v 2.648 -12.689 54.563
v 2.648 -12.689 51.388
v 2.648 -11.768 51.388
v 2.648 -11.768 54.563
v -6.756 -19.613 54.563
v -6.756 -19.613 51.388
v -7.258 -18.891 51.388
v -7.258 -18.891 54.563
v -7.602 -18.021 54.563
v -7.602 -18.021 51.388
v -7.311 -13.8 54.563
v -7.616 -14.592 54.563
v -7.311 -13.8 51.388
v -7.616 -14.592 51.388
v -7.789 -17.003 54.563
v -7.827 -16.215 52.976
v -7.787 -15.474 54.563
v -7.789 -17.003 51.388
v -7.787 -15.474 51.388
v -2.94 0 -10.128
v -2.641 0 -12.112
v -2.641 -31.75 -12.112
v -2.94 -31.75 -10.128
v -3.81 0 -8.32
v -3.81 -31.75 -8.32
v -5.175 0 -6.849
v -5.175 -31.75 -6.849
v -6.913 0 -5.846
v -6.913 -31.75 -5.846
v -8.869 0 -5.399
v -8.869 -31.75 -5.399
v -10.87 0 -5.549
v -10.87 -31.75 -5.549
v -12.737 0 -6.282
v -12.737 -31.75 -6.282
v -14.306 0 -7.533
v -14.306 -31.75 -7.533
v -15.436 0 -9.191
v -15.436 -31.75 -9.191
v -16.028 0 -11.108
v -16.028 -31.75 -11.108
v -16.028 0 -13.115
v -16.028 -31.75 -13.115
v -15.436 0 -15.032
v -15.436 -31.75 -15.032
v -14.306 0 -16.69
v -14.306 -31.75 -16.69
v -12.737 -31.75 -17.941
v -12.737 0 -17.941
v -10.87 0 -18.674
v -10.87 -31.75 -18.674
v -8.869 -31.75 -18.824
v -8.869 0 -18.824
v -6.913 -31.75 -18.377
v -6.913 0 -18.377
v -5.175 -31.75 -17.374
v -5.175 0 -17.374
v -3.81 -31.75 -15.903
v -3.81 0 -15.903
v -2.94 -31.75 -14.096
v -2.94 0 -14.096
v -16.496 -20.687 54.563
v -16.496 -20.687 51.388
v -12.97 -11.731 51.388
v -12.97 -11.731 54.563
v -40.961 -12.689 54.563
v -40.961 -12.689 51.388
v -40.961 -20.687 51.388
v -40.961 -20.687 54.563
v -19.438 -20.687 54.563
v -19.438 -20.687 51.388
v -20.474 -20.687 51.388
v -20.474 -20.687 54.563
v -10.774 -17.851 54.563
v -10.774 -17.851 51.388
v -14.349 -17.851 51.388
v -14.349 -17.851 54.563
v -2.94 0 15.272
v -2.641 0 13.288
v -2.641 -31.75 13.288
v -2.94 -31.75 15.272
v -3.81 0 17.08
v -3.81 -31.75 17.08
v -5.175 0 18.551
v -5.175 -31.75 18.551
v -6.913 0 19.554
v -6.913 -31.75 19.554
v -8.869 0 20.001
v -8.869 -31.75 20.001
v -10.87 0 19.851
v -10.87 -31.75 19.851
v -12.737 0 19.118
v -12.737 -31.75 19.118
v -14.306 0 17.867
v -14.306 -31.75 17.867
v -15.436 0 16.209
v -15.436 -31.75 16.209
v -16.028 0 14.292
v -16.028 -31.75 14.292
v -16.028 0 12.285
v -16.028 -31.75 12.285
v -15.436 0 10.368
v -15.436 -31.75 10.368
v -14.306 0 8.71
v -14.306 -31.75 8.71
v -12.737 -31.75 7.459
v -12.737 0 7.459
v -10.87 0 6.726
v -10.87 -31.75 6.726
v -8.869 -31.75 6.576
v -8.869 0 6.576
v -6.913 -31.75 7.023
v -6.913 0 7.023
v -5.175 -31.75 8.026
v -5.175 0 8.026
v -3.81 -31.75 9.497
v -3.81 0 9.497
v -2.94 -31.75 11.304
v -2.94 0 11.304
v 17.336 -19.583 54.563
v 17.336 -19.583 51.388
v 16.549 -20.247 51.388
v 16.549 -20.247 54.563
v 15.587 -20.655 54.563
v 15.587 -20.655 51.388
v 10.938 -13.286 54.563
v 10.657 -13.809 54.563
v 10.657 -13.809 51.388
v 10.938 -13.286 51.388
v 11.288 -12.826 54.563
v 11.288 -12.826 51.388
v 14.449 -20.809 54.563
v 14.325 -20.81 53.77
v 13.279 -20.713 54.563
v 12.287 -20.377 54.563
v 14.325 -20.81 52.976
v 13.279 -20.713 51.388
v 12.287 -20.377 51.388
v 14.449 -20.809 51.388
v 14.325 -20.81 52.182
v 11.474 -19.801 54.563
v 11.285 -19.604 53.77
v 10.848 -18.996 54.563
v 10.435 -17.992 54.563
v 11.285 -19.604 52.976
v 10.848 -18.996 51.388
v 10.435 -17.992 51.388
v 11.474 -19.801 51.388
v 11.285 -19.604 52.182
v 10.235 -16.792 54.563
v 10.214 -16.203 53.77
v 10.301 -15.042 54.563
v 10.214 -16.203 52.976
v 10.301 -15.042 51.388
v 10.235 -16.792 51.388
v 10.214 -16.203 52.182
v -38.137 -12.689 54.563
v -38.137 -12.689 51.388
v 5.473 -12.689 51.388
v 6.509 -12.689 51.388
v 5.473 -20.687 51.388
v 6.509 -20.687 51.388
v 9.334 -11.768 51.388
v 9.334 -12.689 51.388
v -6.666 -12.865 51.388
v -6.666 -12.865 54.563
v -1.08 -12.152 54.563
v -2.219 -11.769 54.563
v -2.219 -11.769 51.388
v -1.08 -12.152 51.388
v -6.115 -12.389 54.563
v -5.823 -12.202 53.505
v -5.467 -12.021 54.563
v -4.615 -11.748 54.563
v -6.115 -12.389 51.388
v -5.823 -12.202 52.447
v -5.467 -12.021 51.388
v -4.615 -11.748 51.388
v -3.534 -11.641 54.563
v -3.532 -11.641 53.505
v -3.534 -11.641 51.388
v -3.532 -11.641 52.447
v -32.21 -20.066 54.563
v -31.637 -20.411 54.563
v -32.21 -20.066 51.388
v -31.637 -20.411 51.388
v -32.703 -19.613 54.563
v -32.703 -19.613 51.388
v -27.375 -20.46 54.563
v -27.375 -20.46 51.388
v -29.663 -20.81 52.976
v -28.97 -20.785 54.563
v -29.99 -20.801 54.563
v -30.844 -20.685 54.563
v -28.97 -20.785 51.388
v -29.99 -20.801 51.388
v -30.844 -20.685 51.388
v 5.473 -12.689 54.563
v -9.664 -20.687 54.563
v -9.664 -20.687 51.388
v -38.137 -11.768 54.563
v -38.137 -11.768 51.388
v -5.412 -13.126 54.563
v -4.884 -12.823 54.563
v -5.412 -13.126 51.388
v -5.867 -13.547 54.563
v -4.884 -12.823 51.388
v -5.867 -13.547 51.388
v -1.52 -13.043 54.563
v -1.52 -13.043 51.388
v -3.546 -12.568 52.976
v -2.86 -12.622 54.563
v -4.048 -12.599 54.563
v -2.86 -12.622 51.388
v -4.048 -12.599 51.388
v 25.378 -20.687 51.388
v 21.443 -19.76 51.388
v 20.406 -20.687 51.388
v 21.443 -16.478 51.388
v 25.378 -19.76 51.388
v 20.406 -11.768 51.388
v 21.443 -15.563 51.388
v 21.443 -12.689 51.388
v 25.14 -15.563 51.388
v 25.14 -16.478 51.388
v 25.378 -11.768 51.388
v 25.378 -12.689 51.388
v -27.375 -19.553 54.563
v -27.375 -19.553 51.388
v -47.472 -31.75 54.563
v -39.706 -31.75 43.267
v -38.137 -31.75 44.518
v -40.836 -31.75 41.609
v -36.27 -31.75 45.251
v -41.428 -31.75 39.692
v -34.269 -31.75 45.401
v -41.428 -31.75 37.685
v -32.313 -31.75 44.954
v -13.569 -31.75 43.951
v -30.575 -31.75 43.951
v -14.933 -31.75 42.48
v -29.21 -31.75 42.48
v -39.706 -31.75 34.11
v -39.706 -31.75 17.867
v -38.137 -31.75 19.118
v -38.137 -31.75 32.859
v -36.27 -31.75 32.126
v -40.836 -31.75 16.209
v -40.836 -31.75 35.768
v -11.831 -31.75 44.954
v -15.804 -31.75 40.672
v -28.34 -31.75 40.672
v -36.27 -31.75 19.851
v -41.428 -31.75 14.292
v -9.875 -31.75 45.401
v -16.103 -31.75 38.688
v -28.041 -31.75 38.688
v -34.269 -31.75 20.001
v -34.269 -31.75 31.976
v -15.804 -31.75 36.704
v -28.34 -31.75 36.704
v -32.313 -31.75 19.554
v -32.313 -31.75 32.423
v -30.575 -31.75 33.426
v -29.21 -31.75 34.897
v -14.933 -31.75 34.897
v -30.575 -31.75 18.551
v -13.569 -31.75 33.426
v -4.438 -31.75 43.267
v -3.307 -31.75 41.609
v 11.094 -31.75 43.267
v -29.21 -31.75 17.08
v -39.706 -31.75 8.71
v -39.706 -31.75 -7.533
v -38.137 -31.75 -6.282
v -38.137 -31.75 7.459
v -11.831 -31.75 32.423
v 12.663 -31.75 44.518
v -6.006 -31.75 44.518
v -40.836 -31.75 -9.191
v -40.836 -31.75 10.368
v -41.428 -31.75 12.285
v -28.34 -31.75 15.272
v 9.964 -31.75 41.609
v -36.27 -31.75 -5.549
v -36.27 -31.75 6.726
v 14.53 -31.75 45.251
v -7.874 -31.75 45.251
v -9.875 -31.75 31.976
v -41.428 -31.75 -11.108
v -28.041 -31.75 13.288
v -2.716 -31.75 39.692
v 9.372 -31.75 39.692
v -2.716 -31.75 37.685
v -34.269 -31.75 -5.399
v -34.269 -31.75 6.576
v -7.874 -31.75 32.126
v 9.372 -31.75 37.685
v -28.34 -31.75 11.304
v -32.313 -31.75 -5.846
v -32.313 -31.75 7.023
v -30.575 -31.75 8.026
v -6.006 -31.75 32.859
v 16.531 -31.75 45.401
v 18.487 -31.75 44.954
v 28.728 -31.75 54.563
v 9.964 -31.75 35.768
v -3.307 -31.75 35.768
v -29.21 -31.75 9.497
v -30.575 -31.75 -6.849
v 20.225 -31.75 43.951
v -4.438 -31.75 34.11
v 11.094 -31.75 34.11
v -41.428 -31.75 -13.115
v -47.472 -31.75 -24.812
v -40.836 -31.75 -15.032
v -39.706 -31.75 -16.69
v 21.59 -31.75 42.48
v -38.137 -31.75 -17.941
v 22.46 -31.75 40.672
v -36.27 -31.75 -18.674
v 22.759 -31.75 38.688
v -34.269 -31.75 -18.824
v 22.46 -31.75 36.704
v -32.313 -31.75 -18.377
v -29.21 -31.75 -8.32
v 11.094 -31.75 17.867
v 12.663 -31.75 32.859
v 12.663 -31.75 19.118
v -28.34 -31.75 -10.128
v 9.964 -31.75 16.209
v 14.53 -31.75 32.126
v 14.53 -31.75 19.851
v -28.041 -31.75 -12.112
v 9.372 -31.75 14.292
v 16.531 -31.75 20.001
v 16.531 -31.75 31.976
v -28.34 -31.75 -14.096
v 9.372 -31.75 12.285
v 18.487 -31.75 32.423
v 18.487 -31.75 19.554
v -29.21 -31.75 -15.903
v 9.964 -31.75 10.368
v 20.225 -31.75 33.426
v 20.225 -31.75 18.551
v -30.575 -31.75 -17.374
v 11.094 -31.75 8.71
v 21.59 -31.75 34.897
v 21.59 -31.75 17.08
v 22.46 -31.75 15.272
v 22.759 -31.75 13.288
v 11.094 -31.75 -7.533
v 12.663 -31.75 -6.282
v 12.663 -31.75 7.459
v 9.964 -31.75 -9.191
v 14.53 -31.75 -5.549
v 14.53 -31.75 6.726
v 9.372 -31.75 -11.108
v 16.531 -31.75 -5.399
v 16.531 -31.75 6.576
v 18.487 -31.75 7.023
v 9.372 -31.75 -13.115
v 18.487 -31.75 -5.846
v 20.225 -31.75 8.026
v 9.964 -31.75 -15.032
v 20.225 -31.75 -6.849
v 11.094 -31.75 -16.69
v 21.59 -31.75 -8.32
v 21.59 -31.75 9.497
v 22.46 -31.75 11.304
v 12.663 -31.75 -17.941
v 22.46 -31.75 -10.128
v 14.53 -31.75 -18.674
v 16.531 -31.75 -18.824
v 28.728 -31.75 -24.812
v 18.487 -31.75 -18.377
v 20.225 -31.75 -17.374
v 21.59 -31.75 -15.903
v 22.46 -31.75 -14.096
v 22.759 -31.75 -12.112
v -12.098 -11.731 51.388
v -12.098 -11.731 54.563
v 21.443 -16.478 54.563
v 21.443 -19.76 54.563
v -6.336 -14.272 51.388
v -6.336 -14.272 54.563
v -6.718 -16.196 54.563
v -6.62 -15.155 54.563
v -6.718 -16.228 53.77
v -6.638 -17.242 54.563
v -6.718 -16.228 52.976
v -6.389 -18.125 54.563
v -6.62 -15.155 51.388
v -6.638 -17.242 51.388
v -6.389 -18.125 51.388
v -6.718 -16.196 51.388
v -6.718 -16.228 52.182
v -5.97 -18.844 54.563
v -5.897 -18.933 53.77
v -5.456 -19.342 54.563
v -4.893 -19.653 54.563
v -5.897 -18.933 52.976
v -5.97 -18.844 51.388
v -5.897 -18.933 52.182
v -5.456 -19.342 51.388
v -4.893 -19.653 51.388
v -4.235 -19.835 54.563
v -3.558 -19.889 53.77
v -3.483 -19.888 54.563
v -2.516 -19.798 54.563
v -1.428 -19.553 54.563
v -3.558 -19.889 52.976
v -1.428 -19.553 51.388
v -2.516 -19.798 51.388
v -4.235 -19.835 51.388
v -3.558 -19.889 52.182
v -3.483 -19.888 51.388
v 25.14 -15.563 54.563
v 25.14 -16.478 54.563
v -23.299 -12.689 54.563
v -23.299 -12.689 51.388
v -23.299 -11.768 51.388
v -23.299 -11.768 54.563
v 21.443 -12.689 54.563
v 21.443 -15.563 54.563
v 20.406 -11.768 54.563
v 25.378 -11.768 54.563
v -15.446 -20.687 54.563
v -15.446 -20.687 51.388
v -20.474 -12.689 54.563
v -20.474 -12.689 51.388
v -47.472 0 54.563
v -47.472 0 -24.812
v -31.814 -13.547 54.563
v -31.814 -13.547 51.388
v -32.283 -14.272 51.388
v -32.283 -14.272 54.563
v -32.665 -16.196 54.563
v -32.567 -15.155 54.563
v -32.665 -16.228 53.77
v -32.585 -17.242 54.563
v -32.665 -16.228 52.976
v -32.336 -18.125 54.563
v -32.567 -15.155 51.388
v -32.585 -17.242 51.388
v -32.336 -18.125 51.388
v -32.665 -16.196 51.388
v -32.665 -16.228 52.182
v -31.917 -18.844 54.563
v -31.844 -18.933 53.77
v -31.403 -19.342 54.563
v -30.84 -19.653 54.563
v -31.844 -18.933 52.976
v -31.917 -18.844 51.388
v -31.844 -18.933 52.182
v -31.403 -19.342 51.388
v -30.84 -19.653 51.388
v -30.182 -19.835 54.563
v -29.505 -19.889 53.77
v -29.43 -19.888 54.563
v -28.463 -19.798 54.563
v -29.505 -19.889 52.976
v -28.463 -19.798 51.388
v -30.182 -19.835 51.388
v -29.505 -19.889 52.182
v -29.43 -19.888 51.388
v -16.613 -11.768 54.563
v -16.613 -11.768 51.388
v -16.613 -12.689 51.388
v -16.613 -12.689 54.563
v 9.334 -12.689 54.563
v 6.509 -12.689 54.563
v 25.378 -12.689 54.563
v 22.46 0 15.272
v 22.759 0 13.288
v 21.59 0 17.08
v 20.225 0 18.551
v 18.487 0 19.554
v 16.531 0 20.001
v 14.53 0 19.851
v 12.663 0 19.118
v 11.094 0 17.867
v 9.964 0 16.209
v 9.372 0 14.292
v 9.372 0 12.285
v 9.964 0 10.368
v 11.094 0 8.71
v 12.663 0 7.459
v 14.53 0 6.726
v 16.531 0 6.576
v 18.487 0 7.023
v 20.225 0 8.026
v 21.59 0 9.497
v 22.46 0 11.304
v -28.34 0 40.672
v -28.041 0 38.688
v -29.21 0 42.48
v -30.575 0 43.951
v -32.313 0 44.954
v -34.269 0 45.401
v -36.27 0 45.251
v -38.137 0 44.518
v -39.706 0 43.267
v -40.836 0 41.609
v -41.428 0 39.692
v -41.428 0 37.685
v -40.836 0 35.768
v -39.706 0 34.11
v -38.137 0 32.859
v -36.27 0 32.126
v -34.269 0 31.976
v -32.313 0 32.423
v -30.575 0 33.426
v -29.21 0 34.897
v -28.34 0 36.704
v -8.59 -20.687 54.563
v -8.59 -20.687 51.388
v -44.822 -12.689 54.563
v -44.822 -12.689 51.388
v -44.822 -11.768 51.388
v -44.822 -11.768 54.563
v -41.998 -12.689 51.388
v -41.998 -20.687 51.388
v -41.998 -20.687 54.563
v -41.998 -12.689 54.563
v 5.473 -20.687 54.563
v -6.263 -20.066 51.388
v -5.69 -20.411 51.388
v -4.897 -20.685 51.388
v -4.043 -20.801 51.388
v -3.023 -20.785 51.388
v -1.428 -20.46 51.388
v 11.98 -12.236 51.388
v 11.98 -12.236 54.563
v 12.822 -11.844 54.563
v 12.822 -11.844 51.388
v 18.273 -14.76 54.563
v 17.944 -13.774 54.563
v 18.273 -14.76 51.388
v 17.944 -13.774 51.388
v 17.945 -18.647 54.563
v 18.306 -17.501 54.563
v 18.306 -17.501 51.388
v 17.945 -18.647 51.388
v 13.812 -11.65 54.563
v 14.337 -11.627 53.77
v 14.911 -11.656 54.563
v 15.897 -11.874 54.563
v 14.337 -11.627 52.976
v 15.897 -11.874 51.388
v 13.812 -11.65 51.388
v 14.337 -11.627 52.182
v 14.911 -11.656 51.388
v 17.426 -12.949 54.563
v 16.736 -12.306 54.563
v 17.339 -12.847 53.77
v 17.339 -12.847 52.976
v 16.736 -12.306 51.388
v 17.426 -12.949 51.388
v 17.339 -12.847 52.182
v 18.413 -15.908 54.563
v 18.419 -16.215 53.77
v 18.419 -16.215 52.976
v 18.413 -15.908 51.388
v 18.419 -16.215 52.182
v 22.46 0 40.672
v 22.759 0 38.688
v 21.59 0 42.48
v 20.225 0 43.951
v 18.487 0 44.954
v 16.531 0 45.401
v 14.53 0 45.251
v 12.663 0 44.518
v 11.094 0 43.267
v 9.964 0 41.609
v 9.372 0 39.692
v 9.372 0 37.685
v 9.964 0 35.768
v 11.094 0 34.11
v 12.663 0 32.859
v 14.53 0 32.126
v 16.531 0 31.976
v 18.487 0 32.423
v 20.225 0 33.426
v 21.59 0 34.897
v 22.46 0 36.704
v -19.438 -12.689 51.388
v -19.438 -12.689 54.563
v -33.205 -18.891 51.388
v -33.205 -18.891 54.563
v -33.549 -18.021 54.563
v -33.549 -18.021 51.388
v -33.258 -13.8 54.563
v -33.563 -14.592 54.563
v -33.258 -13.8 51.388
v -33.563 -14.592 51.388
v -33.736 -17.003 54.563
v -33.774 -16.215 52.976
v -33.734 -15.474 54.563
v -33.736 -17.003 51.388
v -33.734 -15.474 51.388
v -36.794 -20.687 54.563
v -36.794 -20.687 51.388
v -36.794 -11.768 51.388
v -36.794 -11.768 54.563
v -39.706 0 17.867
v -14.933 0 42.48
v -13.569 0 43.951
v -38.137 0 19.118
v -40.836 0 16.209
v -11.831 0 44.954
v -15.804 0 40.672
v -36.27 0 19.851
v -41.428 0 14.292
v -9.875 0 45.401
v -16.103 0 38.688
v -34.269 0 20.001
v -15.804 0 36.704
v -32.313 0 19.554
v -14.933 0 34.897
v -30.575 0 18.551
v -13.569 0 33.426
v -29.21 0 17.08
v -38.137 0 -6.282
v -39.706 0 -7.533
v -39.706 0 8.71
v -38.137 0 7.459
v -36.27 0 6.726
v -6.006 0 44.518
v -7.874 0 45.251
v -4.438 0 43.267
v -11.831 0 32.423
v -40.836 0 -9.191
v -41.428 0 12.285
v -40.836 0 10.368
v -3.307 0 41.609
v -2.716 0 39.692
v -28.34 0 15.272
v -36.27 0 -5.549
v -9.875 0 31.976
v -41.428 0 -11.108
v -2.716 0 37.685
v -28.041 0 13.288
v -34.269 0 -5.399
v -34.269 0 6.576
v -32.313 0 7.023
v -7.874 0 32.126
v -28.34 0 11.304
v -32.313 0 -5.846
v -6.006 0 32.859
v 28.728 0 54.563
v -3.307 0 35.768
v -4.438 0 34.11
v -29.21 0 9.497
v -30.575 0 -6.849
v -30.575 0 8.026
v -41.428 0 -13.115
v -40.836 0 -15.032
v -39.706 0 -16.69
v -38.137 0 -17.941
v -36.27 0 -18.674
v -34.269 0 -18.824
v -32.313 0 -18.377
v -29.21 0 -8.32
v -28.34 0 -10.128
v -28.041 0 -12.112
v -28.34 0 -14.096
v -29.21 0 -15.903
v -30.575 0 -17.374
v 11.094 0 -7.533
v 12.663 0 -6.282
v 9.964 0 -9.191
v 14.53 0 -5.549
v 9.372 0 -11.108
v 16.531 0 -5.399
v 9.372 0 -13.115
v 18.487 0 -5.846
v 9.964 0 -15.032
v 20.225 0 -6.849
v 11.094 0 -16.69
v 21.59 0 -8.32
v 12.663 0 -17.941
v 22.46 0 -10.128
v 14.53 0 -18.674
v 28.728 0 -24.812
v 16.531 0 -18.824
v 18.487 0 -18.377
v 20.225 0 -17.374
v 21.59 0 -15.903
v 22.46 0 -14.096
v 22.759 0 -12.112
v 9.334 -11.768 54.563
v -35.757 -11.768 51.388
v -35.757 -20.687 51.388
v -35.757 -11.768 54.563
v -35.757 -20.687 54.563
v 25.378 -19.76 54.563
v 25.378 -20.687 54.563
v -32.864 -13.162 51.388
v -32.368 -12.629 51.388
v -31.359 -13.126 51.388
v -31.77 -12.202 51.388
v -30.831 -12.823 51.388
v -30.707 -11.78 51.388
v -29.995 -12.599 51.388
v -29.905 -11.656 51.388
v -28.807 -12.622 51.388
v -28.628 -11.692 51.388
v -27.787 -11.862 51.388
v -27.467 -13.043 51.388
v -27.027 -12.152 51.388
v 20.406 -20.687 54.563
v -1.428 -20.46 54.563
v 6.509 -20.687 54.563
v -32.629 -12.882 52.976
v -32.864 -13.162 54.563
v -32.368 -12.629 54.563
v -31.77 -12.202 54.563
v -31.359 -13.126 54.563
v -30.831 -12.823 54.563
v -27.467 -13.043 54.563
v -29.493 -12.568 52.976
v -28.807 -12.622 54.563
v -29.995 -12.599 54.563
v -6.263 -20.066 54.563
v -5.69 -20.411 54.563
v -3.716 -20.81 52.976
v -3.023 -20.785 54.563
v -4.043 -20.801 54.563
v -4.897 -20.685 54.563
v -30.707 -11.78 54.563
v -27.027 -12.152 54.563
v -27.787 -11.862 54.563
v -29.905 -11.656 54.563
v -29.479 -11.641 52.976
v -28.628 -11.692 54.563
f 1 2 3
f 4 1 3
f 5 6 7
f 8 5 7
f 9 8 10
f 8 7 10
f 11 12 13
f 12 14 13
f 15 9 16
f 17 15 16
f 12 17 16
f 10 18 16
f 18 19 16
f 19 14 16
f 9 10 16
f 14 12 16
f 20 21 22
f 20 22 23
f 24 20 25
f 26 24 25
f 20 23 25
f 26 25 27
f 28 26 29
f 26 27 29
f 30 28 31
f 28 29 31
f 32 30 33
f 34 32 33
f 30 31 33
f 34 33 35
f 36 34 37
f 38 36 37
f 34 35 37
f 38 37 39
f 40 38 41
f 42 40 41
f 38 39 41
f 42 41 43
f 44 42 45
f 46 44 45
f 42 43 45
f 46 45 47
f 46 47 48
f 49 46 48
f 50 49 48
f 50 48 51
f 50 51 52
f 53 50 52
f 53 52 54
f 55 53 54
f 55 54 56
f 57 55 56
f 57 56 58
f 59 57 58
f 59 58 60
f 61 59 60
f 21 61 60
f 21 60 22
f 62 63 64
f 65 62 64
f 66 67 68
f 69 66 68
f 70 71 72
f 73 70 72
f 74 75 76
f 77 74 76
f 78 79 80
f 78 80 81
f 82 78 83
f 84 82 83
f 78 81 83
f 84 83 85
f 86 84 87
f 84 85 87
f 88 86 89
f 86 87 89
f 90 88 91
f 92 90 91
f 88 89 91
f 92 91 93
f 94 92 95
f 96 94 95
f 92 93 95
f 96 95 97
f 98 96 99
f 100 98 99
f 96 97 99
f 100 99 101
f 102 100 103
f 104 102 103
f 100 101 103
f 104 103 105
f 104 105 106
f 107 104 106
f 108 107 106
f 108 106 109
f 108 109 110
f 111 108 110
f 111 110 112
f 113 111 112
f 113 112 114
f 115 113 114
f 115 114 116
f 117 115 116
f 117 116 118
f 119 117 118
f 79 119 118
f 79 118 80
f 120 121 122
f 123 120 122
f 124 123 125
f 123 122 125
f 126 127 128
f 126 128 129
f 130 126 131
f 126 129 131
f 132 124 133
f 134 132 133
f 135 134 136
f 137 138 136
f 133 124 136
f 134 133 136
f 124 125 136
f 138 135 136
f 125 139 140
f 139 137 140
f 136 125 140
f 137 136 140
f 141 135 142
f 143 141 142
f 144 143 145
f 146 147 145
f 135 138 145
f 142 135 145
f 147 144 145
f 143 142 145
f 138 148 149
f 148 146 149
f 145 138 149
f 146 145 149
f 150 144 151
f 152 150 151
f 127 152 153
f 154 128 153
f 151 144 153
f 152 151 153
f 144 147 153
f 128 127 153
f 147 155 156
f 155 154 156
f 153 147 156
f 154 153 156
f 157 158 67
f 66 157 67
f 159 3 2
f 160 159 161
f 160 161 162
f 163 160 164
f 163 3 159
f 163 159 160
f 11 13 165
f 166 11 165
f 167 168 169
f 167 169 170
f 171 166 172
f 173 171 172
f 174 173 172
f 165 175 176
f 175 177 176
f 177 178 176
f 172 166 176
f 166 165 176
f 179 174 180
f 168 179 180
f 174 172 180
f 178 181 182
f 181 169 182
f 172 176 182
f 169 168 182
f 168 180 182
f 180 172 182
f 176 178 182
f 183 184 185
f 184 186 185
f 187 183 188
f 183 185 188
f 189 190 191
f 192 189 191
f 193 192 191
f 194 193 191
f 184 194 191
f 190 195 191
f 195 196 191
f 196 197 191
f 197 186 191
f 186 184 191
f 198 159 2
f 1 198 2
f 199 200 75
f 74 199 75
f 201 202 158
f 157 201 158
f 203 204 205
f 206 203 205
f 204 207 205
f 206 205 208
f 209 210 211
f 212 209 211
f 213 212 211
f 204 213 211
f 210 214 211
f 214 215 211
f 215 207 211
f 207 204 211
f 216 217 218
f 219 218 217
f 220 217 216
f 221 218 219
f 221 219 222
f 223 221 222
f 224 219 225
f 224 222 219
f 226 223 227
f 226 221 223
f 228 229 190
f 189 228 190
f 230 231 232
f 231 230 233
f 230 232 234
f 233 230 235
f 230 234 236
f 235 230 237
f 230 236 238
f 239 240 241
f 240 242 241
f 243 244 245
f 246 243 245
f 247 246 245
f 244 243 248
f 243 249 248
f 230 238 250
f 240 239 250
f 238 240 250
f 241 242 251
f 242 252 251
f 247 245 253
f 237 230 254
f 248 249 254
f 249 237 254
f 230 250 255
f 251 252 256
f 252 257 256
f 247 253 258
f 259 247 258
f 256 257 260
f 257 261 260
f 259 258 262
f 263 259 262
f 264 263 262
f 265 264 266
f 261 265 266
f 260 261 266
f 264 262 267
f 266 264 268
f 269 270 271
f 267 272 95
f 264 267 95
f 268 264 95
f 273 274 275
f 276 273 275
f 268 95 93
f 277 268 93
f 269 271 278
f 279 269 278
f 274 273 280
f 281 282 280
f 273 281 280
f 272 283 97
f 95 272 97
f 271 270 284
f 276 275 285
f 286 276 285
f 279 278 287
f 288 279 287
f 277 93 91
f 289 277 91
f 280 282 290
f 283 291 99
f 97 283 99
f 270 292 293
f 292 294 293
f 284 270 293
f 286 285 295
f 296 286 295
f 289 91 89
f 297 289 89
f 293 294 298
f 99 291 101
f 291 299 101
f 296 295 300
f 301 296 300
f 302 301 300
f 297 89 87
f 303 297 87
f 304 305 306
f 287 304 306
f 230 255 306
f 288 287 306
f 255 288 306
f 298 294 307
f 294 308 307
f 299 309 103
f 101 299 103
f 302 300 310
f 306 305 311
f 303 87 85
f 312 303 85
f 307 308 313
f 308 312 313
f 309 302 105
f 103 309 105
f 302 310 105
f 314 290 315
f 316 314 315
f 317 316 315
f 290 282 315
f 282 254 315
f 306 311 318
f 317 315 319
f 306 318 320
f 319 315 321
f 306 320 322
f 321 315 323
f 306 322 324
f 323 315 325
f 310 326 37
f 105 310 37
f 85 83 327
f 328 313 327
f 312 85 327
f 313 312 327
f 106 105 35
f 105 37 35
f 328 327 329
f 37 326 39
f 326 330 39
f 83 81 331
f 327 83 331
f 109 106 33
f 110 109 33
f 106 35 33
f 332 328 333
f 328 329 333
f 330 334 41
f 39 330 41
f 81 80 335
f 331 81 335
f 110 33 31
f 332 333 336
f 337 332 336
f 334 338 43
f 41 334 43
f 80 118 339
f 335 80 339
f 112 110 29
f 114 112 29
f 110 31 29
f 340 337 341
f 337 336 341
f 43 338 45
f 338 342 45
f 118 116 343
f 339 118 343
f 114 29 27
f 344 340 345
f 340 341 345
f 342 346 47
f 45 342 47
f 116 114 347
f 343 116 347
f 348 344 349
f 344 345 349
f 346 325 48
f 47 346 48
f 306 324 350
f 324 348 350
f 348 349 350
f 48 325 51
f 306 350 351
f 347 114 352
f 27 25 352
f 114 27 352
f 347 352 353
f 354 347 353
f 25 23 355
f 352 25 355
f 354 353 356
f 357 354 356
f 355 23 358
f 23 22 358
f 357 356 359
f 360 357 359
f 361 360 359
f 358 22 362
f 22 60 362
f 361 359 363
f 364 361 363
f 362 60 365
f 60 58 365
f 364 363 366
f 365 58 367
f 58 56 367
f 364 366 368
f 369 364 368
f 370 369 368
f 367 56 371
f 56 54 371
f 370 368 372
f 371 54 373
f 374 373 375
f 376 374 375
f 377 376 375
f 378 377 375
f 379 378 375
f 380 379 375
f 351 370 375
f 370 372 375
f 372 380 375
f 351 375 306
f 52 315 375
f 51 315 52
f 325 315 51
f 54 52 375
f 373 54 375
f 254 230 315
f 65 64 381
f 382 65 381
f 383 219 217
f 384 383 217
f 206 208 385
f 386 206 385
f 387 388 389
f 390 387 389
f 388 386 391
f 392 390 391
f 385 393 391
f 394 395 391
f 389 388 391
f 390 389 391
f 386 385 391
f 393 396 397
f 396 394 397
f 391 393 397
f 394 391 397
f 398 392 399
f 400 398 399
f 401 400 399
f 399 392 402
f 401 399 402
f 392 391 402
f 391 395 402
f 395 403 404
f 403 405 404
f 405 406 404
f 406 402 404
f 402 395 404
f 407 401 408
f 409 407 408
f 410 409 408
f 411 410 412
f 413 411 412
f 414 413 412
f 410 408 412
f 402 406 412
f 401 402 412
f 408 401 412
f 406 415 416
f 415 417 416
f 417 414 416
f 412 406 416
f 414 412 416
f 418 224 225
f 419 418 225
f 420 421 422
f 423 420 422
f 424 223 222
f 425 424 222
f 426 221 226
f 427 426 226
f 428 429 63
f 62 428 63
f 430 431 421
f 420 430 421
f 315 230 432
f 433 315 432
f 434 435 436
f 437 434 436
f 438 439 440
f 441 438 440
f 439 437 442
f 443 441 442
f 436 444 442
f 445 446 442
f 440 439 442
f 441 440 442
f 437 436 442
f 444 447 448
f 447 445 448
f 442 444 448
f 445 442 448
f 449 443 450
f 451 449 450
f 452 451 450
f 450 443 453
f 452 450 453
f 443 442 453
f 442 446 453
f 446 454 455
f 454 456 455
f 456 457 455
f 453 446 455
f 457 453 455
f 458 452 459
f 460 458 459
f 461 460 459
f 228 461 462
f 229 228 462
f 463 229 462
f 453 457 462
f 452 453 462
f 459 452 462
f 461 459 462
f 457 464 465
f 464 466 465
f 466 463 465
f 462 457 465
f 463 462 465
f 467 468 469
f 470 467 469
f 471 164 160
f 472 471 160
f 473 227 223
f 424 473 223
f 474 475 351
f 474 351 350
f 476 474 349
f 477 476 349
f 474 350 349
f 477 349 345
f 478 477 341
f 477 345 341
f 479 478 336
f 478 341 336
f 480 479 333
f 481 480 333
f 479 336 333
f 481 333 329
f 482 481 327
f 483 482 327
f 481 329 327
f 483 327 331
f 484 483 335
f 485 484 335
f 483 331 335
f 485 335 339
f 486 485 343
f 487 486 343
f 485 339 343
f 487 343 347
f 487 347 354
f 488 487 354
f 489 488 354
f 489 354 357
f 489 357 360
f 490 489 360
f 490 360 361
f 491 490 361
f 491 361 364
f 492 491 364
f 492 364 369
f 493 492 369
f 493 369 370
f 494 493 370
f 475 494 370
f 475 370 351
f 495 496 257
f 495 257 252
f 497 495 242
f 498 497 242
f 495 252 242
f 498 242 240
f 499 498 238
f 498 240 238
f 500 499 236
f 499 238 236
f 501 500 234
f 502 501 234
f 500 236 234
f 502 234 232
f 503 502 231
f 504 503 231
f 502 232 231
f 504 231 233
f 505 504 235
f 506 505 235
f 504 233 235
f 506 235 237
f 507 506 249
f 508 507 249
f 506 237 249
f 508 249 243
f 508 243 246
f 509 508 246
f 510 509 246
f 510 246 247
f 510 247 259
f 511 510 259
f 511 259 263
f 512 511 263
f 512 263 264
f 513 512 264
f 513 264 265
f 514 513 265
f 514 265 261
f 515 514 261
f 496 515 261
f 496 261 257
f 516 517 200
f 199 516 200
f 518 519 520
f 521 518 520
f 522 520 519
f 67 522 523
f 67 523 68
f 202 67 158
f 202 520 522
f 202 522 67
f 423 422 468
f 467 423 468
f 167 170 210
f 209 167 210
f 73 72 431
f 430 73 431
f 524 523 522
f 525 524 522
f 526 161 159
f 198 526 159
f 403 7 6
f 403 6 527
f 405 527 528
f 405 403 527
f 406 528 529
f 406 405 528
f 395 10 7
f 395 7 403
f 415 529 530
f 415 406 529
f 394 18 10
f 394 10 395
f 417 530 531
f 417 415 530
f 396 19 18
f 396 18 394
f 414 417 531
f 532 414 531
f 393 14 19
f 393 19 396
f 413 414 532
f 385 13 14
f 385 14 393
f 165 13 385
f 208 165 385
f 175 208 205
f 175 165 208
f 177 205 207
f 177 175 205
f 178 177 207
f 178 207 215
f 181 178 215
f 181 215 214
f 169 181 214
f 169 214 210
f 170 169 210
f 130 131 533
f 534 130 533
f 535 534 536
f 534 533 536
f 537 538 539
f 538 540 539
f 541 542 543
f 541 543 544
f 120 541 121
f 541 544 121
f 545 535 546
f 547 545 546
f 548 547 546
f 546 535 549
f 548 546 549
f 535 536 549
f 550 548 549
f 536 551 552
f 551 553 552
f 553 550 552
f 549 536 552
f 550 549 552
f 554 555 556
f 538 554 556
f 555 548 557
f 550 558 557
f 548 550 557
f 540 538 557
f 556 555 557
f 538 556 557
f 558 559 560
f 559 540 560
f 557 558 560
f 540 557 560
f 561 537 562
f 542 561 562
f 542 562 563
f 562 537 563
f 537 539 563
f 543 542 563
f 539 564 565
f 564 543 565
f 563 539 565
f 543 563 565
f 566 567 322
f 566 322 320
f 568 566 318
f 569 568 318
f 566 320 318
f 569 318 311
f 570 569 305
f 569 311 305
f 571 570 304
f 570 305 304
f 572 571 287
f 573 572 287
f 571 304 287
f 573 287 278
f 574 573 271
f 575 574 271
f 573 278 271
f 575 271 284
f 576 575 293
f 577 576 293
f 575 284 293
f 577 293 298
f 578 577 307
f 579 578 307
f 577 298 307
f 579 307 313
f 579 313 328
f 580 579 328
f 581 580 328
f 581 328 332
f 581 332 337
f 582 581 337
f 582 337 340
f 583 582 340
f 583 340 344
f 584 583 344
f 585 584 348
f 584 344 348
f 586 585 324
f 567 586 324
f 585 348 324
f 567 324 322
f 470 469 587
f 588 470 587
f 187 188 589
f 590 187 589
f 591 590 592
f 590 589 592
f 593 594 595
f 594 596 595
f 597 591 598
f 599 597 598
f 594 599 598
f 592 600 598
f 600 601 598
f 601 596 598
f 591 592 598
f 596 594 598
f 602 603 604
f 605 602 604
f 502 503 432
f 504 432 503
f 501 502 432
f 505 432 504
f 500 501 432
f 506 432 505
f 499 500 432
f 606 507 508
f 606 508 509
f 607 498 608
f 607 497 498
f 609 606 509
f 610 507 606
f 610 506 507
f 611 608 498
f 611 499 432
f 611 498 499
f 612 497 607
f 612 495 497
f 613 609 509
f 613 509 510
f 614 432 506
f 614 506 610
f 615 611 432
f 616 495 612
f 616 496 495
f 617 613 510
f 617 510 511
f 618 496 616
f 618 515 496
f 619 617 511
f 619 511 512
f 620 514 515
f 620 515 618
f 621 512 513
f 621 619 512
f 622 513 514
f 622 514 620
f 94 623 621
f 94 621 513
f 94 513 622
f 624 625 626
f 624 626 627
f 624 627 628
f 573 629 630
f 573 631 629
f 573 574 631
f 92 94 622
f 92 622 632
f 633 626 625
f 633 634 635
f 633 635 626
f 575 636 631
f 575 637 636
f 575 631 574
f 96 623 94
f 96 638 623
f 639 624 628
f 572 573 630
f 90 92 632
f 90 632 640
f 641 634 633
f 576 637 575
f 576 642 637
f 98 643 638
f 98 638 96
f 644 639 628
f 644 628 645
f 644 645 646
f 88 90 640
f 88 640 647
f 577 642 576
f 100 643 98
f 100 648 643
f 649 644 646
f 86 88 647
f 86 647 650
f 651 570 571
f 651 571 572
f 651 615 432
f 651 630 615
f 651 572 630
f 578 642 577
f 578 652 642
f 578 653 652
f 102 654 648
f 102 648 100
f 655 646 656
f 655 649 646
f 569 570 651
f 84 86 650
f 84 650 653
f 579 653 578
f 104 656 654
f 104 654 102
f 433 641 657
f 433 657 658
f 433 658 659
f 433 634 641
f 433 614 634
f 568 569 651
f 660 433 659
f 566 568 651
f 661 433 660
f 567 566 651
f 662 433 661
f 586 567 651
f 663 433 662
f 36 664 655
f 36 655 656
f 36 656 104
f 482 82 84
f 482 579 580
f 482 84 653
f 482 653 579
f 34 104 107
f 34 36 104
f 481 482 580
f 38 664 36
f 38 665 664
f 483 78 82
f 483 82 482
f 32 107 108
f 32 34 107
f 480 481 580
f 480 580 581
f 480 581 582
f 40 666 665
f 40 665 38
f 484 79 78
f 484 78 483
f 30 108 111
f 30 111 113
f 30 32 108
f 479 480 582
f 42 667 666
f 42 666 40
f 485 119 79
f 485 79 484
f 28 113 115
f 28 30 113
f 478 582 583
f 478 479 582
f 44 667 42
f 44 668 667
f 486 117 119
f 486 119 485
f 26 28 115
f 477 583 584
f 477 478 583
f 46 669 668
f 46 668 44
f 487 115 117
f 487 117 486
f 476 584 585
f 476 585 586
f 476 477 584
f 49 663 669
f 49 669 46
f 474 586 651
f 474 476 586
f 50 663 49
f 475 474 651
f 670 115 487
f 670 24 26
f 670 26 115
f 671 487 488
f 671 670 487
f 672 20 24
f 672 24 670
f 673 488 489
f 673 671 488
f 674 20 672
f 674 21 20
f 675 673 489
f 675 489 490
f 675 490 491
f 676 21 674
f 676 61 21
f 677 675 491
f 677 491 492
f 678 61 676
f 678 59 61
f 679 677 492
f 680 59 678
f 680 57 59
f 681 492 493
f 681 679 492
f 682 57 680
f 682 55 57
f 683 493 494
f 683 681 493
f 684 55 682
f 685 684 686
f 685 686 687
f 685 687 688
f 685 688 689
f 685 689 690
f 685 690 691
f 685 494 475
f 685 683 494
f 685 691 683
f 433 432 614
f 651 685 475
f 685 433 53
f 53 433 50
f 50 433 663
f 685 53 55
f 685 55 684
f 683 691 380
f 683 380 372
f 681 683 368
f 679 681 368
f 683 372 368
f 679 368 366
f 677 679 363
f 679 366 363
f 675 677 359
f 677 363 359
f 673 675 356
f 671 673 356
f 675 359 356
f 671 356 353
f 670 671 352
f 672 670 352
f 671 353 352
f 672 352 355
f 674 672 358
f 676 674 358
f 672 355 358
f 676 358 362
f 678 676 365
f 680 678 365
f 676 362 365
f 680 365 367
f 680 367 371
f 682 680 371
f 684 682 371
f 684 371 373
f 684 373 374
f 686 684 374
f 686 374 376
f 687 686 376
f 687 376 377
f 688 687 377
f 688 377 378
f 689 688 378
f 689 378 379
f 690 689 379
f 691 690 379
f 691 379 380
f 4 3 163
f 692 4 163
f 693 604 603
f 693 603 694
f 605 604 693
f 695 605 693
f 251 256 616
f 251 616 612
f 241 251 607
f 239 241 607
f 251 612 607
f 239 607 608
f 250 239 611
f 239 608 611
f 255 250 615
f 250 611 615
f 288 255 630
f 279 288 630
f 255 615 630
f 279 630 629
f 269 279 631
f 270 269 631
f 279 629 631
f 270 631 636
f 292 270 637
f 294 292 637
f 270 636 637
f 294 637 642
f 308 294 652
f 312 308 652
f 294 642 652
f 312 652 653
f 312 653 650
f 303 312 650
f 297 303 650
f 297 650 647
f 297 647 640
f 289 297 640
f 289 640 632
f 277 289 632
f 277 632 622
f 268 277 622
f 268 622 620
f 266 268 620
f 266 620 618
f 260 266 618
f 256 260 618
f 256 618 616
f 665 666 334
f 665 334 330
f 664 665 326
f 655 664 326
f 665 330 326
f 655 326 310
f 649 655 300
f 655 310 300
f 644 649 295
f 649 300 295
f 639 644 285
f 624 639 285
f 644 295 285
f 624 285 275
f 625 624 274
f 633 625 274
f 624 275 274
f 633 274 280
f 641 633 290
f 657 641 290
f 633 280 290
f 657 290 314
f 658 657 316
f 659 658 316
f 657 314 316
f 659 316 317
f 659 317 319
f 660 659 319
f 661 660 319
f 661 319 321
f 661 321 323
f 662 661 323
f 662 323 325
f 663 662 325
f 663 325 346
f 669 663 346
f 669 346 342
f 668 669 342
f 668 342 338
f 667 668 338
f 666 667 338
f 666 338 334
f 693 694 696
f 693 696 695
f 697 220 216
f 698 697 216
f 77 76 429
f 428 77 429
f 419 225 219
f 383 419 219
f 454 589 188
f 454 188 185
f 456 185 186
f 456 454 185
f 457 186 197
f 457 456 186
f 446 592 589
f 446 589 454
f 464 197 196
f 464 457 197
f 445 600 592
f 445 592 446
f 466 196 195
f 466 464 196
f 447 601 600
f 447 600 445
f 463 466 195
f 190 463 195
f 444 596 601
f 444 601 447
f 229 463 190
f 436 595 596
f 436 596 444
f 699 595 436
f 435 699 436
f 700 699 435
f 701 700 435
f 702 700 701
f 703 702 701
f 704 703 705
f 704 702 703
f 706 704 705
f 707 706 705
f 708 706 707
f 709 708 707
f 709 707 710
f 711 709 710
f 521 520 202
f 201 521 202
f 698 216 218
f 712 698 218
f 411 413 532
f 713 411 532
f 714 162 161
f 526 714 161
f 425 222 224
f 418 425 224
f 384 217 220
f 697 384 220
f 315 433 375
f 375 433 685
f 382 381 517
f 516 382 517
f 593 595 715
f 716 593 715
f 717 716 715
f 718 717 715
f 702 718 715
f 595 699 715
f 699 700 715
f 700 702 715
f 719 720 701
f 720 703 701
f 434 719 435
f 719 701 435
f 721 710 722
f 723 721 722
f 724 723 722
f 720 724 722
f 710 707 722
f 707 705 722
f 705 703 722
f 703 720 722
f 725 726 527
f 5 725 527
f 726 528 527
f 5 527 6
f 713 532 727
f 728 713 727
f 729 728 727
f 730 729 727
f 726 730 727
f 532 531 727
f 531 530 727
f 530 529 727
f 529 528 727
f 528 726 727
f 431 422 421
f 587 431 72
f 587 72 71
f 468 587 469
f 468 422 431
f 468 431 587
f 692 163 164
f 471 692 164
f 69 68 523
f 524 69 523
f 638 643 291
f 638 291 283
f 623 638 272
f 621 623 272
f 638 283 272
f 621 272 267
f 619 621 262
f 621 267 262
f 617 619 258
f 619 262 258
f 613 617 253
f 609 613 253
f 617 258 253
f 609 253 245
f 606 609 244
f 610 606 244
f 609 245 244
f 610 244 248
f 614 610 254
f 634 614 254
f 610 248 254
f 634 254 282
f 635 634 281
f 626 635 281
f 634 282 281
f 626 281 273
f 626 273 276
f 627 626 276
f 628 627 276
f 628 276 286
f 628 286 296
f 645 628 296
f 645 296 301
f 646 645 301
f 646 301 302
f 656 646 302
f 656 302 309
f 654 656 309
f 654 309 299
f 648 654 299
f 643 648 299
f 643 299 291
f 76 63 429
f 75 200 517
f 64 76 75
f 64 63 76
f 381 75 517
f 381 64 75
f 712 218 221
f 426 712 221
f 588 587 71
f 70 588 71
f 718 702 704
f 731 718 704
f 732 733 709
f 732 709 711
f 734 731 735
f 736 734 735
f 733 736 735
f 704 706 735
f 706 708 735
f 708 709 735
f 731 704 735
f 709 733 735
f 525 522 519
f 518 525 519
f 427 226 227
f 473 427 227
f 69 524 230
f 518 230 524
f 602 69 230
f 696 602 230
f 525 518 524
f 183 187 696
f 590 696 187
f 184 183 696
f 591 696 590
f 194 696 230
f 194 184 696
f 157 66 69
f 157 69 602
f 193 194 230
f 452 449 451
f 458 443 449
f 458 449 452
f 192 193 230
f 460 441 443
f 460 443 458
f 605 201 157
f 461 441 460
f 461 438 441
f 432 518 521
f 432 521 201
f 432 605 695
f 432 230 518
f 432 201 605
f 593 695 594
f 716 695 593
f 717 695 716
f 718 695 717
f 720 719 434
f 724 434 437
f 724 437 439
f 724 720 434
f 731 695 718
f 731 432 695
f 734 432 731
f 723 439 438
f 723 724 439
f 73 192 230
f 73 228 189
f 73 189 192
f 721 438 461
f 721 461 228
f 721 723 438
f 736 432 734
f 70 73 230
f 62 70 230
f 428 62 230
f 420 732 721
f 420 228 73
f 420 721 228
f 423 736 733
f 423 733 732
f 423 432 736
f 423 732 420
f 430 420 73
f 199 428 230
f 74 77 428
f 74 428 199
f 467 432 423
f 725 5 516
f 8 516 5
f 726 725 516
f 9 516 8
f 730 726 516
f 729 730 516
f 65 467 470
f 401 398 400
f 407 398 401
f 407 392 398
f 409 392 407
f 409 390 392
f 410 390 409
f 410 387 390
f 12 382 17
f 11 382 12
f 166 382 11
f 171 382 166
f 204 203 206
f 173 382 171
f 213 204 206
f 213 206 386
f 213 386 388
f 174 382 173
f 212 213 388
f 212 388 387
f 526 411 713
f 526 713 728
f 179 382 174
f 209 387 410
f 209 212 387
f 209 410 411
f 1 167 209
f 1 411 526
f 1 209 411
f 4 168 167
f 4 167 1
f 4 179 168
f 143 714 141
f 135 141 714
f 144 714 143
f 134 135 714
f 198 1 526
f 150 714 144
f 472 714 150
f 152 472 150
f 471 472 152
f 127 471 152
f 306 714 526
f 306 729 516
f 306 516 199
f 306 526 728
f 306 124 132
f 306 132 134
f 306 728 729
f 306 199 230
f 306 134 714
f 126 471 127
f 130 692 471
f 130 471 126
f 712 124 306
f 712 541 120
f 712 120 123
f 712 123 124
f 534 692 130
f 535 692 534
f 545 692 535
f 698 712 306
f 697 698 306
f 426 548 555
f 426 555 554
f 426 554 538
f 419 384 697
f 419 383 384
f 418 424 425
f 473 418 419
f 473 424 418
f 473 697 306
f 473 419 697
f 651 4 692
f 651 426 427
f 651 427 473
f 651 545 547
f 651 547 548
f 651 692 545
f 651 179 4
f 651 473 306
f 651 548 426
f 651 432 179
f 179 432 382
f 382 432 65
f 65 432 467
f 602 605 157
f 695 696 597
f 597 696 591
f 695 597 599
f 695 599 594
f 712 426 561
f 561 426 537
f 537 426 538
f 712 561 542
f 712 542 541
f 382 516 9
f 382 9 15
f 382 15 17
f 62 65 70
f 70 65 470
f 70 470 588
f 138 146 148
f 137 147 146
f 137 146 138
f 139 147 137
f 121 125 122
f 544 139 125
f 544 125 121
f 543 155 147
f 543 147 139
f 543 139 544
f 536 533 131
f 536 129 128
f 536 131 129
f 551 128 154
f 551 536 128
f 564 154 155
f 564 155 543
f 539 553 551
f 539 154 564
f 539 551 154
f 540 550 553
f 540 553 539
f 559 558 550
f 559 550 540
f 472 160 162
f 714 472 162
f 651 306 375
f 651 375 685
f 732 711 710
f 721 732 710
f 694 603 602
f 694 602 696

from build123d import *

# Parameters (mm, degrees)
F0_W      = 76.2
F0_H      = 76.1999971091
F1_DEPTH  = 31.75
F2_R      = 6.731
F3_DEPTH  = 50.8
F5_R      = 6.731
F6_DEPTH  = 31.75
F7_DEPTH  = 31.751
F8_R      = 6.731
F9_DEPTH  = 31.751
F10_R     = 6.731
F11_DEPTH = 31.751
F12_R     = 6.731
F13_DEPTH = 31.751
F14_R     = 6.731
F15_DEPTH = 31.751
F16_R     = 6.731
F17_DEPTH = 31.751
F18_R     = 6.731
F19_DEPTH = 31.751
F20_W     = 76.2
F20_H     = 31.75
F20_W_2   = 1.036552576
F20_H_2   = 8.9190371367
F21_DEPTH = 3.175


with BuildPart() as f1:
    # F0 (on Front) → F1 (new body)
    with BuildSketch(Plane.XZ):
        with Locations((-9.3718003482, 13.2883749902)):
            Rectangle(F0_W, F0_H)
    extrude(amount=F1_DEPTH)

    # F2 (on face) → F3 (cut)
    with BuildSketch(Plane.XZ.offset(31.75)):
        with Locations((-9.3718003482, 13.2883735448)):
            Circle(F2_R)
    extrude(amount=-F3_DEPTH, mode=Mode.SUBTRACT)

    # F5 (on face) → F6 (cut)
    with BuildSketch(Plane.XZ.offset(31.75)):
        with Locations((16.0281996518, 38.6883735448)):
            Circle(F5_R)
    extrude(amount=-F6_DEPTH, mode=Mode.SUBTRACT)

    # F5 (on face) → F7 (cut, through all)
    with BuildSketch(Plane.XZ.offset(31.75)):
        with Locations((16.0281996518, 13.2883735448)):
            Circle(F5_R)
    extrude(amount=-F7_DEPTH, mode=Mode.SUBTRACT)

    # F8 (on face) → F9 (cut, through all)
    with BuildSketch(Plane(origin=(0, 0, 0), x_dir=(-1, 0, 0), z_dir=(0, 1, 0))):
        with Locations((9.3718003482, 38.6883735448)):
            Circle(F8_R)
    extrude(amount=-F9_DEPTH, mode=Mode.SUBTRACT)

    # F10 (on face) → F11 (cut, through all)
    with BuildSketch(Plane.XZ.offset(31.75)):
        with Locations((-34.7718003482, 38.6883735448)):
            Circle(F10_R)
    extrude(amount=-F11_DEPTH, mode=Mode.SUBTRACT)

    # F12 (on face) → F13 (cut, through all)
    with BuildSketch(Plane.XZ.offset(31.75)):
        with Locations((-34.7718003482, 13.2883735448)):
            Circle(F12_R)
    extrude(amount=-F13_DEPTH, mode=Mode.SUBTRACT)

    # F14 (on face) → F15 (cut, through all)
    with BuildSketch(Plane.XZ.offset(31.75)):
        with Locations((-34.7718003482, -12.1116235643)):
            Circle(F14_R)
    extrude(amount=-F15_DEPTH, mode=Mode.SUBTRACT)

    # F16 (on face) → F17 (cut, through all)
    with BuildSketch(Plane.XZ.offset(31.75)):
        with Locations((-9.3718003482, -12.1116235643)):
            Circle(F16_R)
    extrude(amount=-F17_DEPTH, mode=Mode.SUBTRACT)

    # F18 (on face) → F19 (cut, through all)
    with BuildSketch(Plane.XZ.offset(31.75)):
        with Locations((16.0281996518, -12.1116235643)):
            Circle(F18_R)
    extrude(amount=-F19_DEPTH, mode=Mode.SUBTRACT)

    # F20 (on face) → F21 (join)
    with BuildSketch(Plane.XY.offset(51.3883735448)):
        with Locations((-9.3718003482, -15.875)):
            Rectangle(F20_W, F20_H)
        Polygon((-40.9612769216, -12.6892459309), (-40.9612769216, -20.686903), (-41.9978294976, -20.686903), (-41.9978294976, -12.6892459309), (-44.822484069, -12.6892459309), (-44.822484069, -11.7678658633), (-38.1366223502, -11.7678658633), (-38.1366223502, -12.6892459309), align=None, mode=Mode.SUBTRACT)
        with Locations((-36.2753174892, -16.2273844317)):
            Rectangle(F20_W_2, F20_H_2, mode=Mode.SUBTRACT)
        with BuildLine():
            add(Edge.make_bspline(
                [(-27.46657267, -13.0425717618), (-28.4797003289, -12.5682171932), (-29.4928279879, -12.5682171932)],
                knots=[0, 0, 0, 1, 1, 1], degree=2))
            add(Edge.make_bspline(
                [(-29.4928279879, -12.5682171932), (-30.9627415279, -12.5682171932), (-31.8138468445, -13.5471835149)],
                knots=[0, 0, 0, 1, 1, 1], degree=2))
            add(Edge.make_bspline(
                [(-31.8138468445, -13.5471835149), (-32.6649521611, -14.5261498367), (-32.6649521611, -16.2283604699)],
                knots=[0, 0, 0, 1, 1, 1], degree=2))
            add(Edge.make_bspline(
                [(-32.6649521611, -16.2283604699), (-32.6649521611, -17.977420937), (-31.8441040289, -18.9329623418)],
                knots=[0, 0, 0, 1, 1, 1], degree=2))
            add(Edge.make_bspline(
                [(-31.8441040289, -18.9329623418), (-31.0232558967, -19.8885037466), (-29.5045404464, -19.8885037466)],
                knots=[0, 0, 0, 1, 1, 1], degree=2))
            add(Edge.make_bspline(
                [(-29.5045404464, -19.8885037466), (-28.5714479204, -19.8885037466), (-27.3748250785, -19.5527466033)],
                knots=[0, 0, 0, 1, 1, 1], degree=2))
            Line((-27.3748250785, -19.5527466033), (-27.3748250785, -20.4604621359))
            add(Edge.make_bspline(
                [(-27.3748250785, -20.4604621359), (-28.3020613753, -20.8098838141), (-29.662658636, -20.8098838141)],
                knots=[0, 0, 0, 1, 1, 1], degree=2))
            add(Edge.make_bspline(
                [(-29.662658636, -20.8098838141), (-31.6323037379, -20.8098838141), (-32.7030176512, -19.6132609722)],
                knots=[0, 0, 0, 1, 1, 1], degree=2))
            add(Edge.make_bspline(
                [(-32.7030176512, -19.6132609722), (-33.7737315644, -18.4166381302), (-33.7737315644, -16.214695935)],
                knots=[0, 0, 0, 1, 1, 1], degree=2))
            add(Edge.make_bspline(
                [(-33.7737315644, -16.214695935), (-33.7737315644, -14.8365299865), (-33.258383391, -13.7999774106)],
                knots=[0, 0, 0, 1, 1, 1], degree=2))
            add(Edge.make_bspline(
                [(-33.258383391, -13.7999774106), (-32.7430352176, -12.7634248346), (-31.7699251252, -12.2022028655)],
                knots=[0, 0, 0, 1, 1, 1], degree=2))
            add(Edge.make_bspline(
                [(-31.7699251252, -12.2022028655), (-30.7968150327, -11.6409808964), (-29.479163453, -11.6409808964)],
                knots=[0, 0, 0, 1, 1, 1], degree=2))
            add(Edge.make_bspline(
                [(-29.479163453, -11.6409808964), (-28.0775725876, -11.6409808964), (-27.0273554768, -12.1524249169)],
                knots=[0, 0, 0, 1, 1, 1], degree=2))
            Line((-27.0273554768, -12.1524249169), (-27.46657267, -13.0425717618))
        make_face(mode=Mode.SUBTRACT)
        Polygon((-19.4376823782, -12.6892459309), (-19.4376823782, -20.686903), (-20.4742349542, -20.686903), (-20.4742349542, -12.6892459309), (-23.2988895256, -12.6892459309), (-23.2988895256, -11.7678658633), (-16.6130278068, -11.7678658633), (-16.6130278068, -12.6892459309), align=None, mode=Mode.SUBTRACT)
        Polygon((-8.5899937443, -20.686903), (-9.6636357721, -20.686903), (-10.7743672518, -17.8505359701), (-14.3486191663, -17.8505359701), (-15.4456861111, -20.686903), (-16.4959032219, -20.686903), (-12.9704532178, -11.7307764115), (-12.0978750606, -11.7307764115), align=None, mode=Mode.SUBTRACT)
        with BuildLine():
            add(Edge.make_bspline(
                [(-1.5195729719, -13.0425717618), (-2.5327006309, -12.5682171932), (-3.5458282899, -12.5682171932)],
                knots=[0, 0, 0, 1, 1, 1], degree=2))
            add(Edge.make_bspline(
                [(-3.5458282899, -12.5682171932), (-5.0157418298, -12.5682171932), (-5.8668471464, -13.5471835149)],
                knots=[0, 0, 0, 1, 1, 1], degree=2))
            add(Edge.make_bspline(
                [(-5.8668471464, -13.5471835149), (-6.717952463, -14.5261498367), (-6.717952463, -16.2283604699)],
                knots=[0, 0, 0, 1, 1, 1], degree=2))
            add(Edge.make_bspline(
                [(-6.717952463, -16.2283604699), (-6.717952463, -17.977420937), (-5.8971043308, -18.9329623418)],
                knots=[0, 0, 0, 1, 1, 1], degree=2))
            add(Edge.make_bspline(
                [(-5.8971043308, -18.9329623418), (-5.0762561986, -19.8885037466), (-3.5575407483, -19.8885037466)],
                knots=[0, 0, 0, 1, 1, 1], degree=2))
            add(Edge.make_bspline(
                [(-3.5575407483, -19.8885037466), (-2.6244482223, -19.8885037466), (-1.4278253804, -19.5527466033)],
                knots=[0, 0, 0, 1, 1, 1], degree=2))
            Line((-1.4278253804, -19.5527466033), (-1.4278253804, -20.4604621359))
            add(Edge.make_bspline(
                [(-1.4278253804, -20.4604621359), (-2.3550616772, -20.8098838141), (-3.7156589379, -20.8098838141)],
                knots=[0, 0, 0, 1, 1, 1], degree=2))
            add(Edge.make_bspline(
                [(-3.7156589379, -20.8098838141), (-5.6853040399, -20.8098838141), (-6.7560179531, -19.6132609722)],
                knots=[0, 0, 0, 1, 1, 1], degree=2))
            add(Edge.make_bspline(
                [(-6.7560179531, -19.6132609722), (-7.8267318663, -18.4166381302), (-7.8267318663, -16.214695935)],
                knots=[0, 0, 0, 1, 1, 1], degree=2))
            add(Edge.make_bspline(
                [(-7.8267318663, -16.214695935), (-7.8267318663, -14.8365299865), (-7.3113836929, -13.7999774106)],
                knots=[0, 0, 0, 1, 1, 1], degree=2))
            add(Edge.make_bspline(
                [(-7.3113836929, -13.7999774106), (-6.7960355196, -12.7634248346), (-5.8229254271, -12.2022028655)],
                knots=[0, 0, 0, 1, 1, 1], degree=2))
            add(Edge.make_bspline(
                [(-5.8229254271, -12.2022028655), (-4.8498153346, -11.6409808964), (-3.532163755, -11.6409808964)],
                knots=[0, 0, 0, 1, 1, 1], degree=2))
            add(Edge.make_bspline(
                [(-3.532163755, -11.6409808964), (-2.1305728895, -11.6409808964), (-1.0803557787, -12.1524249169)],
                knots=[0, 0, 0, 1, 1, 1], degree=2))
            Line((-1.0803557787, -12.1524249169), (-1.5195729719, -13.0425717618))
        make_face(mode=Mode.SUBTRACT)
        Polygon((6.5093173199, -12.6892459309), (6.5093173199, -20.686903), (5.4727647439, -20.686903), (5.4727647439, -12.6892459309), (2.6481101725, -12.6892459309), (2.6481101725, -11.7678658633), (9.3339718913, -11.7678658633), (9.3339718913, -12.6892459309), align=None, mode=Mode.SUBTRACT)
        with BuildLine():
            add(Edge.make_bspline(
                [(17.3394372661, -12.8473641204), (18.4189355232, -14.0674118793), (18.4189355232, -16.214695935)],
                knots=[0, 0, 0, 1, 1, 1], degree=2))
            add(Edge.make_bspline(
                [(18.4189355232, -16.214695935), (18.4189355232, -18.3561237614), (17.3355331133, -19.5830037877)],
                knots=[0, 0, 0, 1, 1, 1], degree=2))
            add(Edge.make_bspline(
                [(17.3355331133, -19.5830037877), (16.2521307034, -20.8098838141), (14.3254312825, -20.8098838141)],
                knots=[0, 0, 0, 1, 1, 1], degree=2))
            add(Edge.make_bspline(
                [(14.3254312825, -20.8098838141), (12.3557861805, -20.8098838141), (11.2850722673, -19.6044766283)],
                knots=[0, 0, 0, 1, 1, 1], degree=2))
            add(Edge.make_bspline(
                [(11.2850722673, -19.6044766283), (10.2143583541, -18.3990694425), (10.2143583541, -16.2029834765)],
                knots=[0, 0, 0, 1, 1, 1], degree=2))
            add(Edge.make_bspline(
                [(10.2143583541, -16.2029834765), (10.2143583541, -14.0244661982), (11.2880003819, -12.8258912799)],
                knots=[0, 0, 0, 1, 1, 1], degree=2))
            add(Edge.make_bspline(
                [(11.2880003819, -12.8258912799), (12.3616424098, -11.6273163615), (14.337143741, -11.6273163615)],
                knots=[0, 0, 0, 1, 1, 1], degree=2))
            add(Edge.make_bspline(
                [(14.337143741, -11.6273163615), (16.259939009, -11.6273163615), (17.3394372661, -12.8473641204)],
                knots=[0, 0, 0, 1, 1, 1], degree=2))
        make_face(mode=Mode.SUBTRACT)
        Polygon((25.3780879399, -19.7596667032), (25.3780879399, -20.686903), (20.4061493129, -20.686903), (20.4061493129, -11.7678658633), (25.3780879399, -11.7678658633), (25.3780879399, -12.6892459309), (21.4427018888, -12.6892459309), (21.4427018888, -15.5627024126), (25.1399346174, -15.5627024126), (25.1399346174, -16.4782262509), (21.4427018888, -16.4782262509), (21.4427018888, -19.7596667032), align=None, mode=Mode.SUBTRACT)
    extrude(amount=F21_DEPTH)


solid = f1.part
